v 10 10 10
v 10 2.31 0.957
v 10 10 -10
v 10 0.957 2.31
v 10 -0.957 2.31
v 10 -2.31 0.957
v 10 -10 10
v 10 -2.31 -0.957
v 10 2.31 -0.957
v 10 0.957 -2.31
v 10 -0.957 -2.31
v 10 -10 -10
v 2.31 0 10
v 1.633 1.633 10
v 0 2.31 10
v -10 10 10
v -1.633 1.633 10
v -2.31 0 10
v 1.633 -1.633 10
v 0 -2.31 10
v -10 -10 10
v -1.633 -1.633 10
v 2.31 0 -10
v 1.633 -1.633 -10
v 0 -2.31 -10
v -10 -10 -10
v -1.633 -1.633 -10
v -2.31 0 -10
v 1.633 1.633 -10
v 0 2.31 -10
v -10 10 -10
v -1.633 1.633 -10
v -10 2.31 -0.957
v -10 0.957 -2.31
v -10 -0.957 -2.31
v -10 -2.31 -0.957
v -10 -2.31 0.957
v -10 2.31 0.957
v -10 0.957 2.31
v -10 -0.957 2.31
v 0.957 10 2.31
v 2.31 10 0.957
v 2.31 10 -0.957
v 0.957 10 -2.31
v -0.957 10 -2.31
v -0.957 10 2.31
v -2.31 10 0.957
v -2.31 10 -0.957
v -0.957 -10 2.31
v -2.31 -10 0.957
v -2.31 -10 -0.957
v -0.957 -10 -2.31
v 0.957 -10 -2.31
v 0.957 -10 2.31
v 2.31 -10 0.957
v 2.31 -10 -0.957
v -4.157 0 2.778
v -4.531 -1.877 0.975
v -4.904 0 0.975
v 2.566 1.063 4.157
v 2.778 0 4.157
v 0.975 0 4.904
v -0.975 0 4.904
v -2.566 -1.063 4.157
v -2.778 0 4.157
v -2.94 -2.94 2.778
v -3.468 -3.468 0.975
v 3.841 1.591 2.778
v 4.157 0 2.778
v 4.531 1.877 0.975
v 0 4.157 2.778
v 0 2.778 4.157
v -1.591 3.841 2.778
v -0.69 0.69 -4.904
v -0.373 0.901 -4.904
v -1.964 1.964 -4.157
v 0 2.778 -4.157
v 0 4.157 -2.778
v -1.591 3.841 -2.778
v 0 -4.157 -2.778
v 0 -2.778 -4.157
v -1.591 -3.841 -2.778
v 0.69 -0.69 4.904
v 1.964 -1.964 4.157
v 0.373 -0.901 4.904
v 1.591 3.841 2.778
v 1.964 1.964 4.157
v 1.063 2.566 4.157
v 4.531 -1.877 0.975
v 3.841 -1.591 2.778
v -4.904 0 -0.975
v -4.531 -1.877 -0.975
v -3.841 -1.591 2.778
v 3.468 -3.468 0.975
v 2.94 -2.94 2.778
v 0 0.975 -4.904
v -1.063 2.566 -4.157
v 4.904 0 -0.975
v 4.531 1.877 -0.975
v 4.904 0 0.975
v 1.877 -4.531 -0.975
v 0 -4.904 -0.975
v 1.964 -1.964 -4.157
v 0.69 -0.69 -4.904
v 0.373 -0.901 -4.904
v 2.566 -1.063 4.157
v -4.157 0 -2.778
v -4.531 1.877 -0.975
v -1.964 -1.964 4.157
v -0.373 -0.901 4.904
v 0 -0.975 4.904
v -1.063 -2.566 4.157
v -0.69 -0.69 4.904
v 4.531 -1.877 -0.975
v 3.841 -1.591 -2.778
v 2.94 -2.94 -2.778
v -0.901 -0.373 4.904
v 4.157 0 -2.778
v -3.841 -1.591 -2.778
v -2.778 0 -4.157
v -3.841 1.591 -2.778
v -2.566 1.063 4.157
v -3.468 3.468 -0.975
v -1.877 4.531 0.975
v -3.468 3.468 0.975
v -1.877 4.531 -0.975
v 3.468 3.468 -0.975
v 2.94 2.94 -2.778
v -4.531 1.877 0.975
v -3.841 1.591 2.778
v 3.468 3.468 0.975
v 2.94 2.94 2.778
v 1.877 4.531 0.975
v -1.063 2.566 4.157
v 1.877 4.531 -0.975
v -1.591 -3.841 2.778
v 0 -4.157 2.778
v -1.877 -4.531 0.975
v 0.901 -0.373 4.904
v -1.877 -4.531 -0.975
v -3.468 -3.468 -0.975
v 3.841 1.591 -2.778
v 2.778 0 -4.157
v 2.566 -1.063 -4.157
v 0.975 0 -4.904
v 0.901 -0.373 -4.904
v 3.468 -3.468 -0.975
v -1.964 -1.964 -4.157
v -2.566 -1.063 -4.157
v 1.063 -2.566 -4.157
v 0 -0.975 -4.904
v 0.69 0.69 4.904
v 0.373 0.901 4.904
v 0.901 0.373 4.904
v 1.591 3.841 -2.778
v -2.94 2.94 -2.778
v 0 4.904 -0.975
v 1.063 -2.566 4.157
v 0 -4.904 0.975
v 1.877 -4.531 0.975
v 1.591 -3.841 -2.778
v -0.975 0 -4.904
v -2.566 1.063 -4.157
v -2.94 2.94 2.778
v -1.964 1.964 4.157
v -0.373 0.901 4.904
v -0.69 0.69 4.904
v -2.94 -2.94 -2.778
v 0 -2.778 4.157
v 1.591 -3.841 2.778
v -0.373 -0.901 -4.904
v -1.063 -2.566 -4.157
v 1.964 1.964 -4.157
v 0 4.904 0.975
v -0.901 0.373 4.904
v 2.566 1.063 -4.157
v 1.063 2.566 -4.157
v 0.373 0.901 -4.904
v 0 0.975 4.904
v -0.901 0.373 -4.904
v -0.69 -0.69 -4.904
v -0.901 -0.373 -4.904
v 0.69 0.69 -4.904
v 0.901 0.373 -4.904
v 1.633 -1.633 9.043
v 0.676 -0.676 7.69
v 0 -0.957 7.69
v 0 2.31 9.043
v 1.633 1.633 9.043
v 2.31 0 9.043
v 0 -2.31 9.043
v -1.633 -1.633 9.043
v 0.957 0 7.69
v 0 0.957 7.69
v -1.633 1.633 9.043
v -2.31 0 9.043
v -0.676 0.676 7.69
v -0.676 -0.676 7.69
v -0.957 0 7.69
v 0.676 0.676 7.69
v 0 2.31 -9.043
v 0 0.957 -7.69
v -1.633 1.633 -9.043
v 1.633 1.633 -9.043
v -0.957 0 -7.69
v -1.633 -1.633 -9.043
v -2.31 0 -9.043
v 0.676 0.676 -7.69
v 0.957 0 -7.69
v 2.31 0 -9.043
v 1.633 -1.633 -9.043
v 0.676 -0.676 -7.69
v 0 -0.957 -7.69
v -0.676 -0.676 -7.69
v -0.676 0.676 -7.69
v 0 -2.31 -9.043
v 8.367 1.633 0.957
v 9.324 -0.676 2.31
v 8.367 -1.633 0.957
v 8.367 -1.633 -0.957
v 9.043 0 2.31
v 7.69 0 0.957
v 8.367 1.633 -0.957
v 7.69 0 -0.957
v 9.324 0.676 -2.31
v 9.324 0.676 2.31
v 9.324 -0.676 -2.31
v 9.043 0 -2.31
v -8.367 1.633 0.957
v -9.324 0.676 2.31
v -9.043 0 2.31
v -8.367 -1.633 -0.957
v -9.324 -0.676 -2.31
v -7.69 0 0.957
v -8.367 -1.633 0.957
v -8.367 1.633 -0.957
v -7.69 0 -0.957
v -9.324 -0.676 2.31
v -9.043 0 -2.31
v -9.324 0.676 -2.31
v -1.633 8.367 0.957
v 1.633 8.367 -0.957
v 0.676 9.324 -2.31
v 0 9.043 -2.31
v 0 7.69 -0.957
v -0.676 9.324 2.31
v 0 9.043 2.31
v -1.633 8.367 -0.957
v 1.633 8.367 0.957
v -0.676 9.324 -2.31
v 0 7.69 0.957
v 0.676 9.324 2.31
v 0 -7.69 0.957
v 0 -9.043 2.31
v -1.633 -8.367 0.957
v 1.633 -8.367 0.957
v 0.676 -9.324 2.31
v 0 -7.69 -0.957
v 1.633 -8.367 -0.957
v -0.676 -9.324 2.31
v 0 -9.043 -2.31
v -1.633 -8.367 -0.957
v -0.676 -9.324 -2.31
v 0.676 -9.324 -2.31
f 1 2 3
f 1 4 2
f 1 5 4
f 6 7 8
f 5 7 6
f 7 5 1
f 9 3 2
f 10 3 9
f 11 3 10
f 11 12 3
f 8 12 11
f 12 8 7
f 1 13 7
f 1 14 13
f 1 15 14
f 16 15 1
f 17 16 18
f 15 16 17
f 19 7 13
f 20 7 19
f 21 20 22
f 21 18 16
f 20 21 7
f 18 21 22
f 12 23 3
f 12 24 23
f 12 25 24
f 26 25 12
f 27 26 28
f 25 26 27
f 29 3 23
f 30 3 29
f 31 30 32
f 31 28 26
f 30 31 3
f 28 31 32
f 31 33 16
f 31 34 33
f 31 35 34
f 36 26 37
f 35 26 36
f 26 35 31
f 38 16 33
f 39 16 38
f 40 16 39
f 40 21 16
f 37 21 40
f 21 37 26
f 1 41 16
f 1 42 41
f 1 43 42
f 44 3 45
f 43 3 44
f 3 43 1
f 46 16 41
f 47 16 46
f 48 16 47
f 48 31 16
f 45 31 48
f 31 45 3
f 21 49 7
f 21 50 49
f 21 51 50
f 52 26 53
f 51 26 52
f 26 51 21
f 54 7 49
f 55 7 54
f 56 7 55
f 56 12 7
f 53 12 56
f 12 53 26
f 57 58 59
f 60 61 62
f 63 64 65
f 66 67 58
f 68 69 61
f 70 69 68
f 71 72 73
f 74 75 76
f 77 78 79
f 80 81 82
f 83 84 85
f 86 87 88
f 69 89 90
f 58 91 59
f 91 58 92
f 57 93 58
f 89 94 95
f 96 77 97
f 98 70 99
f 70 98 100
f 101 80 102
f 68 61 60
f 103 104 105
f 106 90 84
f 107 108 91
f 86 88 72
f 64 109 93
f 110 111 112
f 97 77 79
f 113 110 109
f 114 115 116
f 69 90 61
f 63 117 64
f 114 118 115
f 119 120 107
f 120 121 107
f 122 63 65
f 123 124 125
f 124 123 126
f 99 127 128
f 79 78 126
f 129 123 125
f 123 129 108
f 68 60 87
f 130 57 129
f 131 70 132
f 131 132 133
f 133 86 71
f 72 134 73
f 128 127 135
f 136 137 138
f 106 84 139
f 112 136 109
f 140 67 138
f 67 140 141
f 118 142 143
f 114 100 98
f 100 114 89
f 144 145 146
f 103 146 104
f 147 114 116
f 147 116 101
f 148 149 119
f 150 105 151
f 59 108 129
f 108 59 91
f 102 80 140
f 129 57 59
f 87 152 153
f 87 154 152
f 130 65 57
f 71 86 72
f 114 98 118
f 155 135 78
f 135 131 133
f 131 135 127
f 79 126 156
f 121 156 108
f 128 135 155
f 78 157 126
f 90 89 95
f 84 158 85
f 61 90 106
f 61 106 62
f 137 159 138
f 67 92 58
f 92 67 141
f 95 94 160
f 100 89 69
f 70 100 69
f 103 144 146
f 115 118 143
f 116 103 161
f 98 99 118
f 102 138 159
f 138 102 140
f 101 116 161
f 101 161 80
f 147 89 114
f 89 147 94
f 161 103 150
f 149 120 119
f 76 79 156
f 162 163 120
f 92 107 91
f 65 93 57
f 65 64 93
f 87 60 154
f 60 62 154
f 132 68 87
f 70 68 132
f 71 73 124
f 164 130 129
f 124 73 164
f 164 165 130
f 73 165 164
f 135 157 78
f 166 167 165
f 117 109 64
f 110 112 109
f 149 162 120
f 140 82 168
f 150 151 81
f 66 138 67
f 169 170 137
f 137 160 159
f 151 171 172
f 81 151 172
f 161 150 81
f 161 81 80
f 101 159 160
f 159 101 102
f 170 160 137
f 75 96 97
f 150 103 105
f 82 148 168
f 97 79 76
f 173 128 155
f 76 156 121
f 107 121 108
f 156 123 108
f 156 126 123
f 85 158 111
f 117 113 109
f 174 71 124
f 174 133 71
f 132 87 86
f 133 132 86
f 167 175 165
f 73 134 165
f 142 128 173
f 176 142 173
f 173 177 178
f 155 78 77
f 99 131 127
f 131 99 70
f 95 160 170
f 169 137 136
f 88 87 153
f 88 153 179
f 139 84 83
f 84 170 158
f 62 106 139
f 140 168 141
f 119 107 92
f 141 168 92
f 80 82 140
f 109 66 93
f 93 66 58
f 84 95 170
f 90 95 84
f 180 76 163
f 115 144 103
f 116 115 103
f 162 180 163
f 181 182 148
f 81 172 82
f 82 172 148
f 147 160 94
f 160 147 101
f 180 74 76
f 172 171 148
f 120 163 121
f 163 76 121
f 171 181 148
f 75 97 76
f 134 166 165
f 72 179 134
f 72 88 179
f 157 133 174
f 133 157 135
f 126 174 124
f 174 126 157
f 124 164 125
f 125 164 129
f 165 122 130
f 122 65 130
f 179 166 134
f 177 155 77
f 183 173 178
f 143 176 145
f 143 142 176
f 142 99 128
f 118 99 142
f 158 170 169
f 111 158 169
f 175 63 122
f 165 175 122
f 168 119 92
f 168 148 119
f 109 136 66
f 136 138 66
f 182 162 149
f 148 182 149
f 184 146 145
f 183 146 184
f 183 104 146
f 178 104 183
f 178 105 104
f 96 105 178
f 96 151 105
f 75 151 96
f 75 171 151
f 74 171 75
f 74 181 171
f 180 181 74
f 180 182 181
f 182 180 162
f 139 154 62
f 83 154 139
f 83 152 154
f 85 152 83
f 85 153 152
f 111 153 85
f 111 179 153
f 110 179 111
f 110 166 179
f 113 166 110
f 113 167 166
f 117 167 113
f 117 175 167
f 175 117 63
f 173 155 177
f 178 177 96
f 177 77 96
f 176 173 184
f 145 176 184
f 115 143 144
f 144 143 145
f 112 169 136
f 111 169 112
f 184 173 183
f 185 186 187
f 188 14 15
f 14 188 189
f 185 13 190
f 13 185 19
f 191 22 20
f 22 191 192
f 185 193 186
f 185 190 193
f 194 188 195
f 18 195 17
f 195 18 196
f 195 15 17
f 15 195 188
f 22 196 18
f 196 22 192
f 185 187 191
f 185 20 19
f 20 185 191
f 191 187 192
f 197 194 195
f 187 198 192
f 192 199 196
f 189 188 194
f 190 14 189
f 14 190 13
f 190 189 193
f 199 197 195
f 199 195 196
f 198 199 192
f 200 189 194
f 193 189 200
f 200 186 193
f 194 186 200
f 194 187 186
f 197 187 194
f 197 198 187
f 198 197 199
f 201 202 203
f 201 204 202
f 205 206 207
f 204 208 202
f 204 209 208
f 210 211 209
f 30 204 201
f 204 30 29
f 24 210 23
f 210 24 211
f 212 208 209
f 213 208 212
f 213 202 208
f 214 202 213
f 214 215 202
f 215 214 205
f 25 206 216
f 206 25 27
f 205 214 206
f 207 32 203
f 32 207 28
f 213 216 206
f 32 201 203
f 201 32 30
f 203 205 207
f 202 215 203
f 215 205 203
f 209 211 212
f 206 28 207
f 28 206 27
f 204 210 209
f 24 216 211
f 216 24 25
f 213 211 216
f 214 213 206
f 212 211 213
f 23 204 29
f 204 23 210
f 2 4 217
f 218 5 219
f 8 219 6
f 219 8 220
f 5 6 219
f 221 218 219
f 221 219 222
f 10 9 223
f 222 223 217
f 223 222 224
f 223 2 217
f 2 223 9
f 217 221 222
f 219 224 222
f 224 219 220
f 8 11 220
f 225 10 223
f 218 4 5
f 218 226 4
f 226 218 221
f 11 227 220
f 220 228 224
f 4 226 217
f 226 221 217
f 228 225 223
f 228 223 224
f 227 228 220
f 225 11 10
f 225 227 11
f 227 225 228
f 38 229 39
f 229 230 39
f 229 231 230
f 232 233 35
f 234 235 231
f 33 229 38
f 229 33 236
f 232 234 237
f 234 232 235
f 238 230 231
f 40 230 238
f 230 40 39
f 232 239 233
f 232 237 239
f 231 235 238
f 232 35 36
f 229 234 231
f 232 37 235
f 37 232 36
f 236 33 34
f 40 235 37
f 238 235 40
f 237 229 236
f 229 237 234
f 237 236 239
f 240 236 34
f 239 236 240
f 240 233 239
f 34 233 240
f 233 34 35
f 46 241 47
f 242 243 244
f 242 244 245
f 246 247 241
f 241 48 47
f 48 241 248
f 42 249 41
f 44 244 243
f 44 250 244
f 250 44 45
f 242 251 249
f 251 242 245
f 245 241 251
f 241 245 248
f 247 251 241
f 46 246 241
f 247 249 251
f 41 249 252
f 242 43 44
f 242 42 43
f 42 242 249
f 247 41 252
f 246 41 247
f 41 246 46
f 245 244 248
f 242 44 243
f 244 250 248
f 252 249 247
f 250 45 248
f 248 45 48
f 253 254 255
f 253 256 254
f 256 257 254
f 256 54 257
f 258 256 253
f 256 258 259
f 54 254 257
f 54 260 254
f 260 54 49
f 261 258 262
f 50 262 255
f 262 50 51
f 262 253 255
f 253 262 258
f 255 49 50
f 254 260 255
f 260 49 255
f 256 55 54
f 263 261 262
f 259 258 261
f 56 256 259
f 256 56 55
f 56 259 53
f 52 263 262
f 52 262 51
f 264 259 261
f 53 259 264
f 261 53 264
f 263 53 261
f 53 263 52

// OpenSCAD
// Simple parametric cube example
cube_size = 20;
sphere_radius = 5;

difference() {
    // Main cube
    cube([cube_size, cube_size, cube_size], center = true);
    
    // Subtract spheres from each face center
    sphere(r = sphere_radius);
    translate([0, 0, cube_size/2]) sphere(r = sphere_radius/2);
    translate([0, 0, -cube_size/2]) sphere(r = sphere_radius/2);
    translate([cube_size/2, 0, 0]) sphere(r = sphere_radius/2);
    translate([-cube_size/2, 0, 0]) sphere(r = sphere_radius/2);
    translate([0, cube_size/2, 0]) sphere(r = sphere_radius/2);
    translate([0, -cube_size/2, 0]) sphere(r = sphere_radius/2);
}
